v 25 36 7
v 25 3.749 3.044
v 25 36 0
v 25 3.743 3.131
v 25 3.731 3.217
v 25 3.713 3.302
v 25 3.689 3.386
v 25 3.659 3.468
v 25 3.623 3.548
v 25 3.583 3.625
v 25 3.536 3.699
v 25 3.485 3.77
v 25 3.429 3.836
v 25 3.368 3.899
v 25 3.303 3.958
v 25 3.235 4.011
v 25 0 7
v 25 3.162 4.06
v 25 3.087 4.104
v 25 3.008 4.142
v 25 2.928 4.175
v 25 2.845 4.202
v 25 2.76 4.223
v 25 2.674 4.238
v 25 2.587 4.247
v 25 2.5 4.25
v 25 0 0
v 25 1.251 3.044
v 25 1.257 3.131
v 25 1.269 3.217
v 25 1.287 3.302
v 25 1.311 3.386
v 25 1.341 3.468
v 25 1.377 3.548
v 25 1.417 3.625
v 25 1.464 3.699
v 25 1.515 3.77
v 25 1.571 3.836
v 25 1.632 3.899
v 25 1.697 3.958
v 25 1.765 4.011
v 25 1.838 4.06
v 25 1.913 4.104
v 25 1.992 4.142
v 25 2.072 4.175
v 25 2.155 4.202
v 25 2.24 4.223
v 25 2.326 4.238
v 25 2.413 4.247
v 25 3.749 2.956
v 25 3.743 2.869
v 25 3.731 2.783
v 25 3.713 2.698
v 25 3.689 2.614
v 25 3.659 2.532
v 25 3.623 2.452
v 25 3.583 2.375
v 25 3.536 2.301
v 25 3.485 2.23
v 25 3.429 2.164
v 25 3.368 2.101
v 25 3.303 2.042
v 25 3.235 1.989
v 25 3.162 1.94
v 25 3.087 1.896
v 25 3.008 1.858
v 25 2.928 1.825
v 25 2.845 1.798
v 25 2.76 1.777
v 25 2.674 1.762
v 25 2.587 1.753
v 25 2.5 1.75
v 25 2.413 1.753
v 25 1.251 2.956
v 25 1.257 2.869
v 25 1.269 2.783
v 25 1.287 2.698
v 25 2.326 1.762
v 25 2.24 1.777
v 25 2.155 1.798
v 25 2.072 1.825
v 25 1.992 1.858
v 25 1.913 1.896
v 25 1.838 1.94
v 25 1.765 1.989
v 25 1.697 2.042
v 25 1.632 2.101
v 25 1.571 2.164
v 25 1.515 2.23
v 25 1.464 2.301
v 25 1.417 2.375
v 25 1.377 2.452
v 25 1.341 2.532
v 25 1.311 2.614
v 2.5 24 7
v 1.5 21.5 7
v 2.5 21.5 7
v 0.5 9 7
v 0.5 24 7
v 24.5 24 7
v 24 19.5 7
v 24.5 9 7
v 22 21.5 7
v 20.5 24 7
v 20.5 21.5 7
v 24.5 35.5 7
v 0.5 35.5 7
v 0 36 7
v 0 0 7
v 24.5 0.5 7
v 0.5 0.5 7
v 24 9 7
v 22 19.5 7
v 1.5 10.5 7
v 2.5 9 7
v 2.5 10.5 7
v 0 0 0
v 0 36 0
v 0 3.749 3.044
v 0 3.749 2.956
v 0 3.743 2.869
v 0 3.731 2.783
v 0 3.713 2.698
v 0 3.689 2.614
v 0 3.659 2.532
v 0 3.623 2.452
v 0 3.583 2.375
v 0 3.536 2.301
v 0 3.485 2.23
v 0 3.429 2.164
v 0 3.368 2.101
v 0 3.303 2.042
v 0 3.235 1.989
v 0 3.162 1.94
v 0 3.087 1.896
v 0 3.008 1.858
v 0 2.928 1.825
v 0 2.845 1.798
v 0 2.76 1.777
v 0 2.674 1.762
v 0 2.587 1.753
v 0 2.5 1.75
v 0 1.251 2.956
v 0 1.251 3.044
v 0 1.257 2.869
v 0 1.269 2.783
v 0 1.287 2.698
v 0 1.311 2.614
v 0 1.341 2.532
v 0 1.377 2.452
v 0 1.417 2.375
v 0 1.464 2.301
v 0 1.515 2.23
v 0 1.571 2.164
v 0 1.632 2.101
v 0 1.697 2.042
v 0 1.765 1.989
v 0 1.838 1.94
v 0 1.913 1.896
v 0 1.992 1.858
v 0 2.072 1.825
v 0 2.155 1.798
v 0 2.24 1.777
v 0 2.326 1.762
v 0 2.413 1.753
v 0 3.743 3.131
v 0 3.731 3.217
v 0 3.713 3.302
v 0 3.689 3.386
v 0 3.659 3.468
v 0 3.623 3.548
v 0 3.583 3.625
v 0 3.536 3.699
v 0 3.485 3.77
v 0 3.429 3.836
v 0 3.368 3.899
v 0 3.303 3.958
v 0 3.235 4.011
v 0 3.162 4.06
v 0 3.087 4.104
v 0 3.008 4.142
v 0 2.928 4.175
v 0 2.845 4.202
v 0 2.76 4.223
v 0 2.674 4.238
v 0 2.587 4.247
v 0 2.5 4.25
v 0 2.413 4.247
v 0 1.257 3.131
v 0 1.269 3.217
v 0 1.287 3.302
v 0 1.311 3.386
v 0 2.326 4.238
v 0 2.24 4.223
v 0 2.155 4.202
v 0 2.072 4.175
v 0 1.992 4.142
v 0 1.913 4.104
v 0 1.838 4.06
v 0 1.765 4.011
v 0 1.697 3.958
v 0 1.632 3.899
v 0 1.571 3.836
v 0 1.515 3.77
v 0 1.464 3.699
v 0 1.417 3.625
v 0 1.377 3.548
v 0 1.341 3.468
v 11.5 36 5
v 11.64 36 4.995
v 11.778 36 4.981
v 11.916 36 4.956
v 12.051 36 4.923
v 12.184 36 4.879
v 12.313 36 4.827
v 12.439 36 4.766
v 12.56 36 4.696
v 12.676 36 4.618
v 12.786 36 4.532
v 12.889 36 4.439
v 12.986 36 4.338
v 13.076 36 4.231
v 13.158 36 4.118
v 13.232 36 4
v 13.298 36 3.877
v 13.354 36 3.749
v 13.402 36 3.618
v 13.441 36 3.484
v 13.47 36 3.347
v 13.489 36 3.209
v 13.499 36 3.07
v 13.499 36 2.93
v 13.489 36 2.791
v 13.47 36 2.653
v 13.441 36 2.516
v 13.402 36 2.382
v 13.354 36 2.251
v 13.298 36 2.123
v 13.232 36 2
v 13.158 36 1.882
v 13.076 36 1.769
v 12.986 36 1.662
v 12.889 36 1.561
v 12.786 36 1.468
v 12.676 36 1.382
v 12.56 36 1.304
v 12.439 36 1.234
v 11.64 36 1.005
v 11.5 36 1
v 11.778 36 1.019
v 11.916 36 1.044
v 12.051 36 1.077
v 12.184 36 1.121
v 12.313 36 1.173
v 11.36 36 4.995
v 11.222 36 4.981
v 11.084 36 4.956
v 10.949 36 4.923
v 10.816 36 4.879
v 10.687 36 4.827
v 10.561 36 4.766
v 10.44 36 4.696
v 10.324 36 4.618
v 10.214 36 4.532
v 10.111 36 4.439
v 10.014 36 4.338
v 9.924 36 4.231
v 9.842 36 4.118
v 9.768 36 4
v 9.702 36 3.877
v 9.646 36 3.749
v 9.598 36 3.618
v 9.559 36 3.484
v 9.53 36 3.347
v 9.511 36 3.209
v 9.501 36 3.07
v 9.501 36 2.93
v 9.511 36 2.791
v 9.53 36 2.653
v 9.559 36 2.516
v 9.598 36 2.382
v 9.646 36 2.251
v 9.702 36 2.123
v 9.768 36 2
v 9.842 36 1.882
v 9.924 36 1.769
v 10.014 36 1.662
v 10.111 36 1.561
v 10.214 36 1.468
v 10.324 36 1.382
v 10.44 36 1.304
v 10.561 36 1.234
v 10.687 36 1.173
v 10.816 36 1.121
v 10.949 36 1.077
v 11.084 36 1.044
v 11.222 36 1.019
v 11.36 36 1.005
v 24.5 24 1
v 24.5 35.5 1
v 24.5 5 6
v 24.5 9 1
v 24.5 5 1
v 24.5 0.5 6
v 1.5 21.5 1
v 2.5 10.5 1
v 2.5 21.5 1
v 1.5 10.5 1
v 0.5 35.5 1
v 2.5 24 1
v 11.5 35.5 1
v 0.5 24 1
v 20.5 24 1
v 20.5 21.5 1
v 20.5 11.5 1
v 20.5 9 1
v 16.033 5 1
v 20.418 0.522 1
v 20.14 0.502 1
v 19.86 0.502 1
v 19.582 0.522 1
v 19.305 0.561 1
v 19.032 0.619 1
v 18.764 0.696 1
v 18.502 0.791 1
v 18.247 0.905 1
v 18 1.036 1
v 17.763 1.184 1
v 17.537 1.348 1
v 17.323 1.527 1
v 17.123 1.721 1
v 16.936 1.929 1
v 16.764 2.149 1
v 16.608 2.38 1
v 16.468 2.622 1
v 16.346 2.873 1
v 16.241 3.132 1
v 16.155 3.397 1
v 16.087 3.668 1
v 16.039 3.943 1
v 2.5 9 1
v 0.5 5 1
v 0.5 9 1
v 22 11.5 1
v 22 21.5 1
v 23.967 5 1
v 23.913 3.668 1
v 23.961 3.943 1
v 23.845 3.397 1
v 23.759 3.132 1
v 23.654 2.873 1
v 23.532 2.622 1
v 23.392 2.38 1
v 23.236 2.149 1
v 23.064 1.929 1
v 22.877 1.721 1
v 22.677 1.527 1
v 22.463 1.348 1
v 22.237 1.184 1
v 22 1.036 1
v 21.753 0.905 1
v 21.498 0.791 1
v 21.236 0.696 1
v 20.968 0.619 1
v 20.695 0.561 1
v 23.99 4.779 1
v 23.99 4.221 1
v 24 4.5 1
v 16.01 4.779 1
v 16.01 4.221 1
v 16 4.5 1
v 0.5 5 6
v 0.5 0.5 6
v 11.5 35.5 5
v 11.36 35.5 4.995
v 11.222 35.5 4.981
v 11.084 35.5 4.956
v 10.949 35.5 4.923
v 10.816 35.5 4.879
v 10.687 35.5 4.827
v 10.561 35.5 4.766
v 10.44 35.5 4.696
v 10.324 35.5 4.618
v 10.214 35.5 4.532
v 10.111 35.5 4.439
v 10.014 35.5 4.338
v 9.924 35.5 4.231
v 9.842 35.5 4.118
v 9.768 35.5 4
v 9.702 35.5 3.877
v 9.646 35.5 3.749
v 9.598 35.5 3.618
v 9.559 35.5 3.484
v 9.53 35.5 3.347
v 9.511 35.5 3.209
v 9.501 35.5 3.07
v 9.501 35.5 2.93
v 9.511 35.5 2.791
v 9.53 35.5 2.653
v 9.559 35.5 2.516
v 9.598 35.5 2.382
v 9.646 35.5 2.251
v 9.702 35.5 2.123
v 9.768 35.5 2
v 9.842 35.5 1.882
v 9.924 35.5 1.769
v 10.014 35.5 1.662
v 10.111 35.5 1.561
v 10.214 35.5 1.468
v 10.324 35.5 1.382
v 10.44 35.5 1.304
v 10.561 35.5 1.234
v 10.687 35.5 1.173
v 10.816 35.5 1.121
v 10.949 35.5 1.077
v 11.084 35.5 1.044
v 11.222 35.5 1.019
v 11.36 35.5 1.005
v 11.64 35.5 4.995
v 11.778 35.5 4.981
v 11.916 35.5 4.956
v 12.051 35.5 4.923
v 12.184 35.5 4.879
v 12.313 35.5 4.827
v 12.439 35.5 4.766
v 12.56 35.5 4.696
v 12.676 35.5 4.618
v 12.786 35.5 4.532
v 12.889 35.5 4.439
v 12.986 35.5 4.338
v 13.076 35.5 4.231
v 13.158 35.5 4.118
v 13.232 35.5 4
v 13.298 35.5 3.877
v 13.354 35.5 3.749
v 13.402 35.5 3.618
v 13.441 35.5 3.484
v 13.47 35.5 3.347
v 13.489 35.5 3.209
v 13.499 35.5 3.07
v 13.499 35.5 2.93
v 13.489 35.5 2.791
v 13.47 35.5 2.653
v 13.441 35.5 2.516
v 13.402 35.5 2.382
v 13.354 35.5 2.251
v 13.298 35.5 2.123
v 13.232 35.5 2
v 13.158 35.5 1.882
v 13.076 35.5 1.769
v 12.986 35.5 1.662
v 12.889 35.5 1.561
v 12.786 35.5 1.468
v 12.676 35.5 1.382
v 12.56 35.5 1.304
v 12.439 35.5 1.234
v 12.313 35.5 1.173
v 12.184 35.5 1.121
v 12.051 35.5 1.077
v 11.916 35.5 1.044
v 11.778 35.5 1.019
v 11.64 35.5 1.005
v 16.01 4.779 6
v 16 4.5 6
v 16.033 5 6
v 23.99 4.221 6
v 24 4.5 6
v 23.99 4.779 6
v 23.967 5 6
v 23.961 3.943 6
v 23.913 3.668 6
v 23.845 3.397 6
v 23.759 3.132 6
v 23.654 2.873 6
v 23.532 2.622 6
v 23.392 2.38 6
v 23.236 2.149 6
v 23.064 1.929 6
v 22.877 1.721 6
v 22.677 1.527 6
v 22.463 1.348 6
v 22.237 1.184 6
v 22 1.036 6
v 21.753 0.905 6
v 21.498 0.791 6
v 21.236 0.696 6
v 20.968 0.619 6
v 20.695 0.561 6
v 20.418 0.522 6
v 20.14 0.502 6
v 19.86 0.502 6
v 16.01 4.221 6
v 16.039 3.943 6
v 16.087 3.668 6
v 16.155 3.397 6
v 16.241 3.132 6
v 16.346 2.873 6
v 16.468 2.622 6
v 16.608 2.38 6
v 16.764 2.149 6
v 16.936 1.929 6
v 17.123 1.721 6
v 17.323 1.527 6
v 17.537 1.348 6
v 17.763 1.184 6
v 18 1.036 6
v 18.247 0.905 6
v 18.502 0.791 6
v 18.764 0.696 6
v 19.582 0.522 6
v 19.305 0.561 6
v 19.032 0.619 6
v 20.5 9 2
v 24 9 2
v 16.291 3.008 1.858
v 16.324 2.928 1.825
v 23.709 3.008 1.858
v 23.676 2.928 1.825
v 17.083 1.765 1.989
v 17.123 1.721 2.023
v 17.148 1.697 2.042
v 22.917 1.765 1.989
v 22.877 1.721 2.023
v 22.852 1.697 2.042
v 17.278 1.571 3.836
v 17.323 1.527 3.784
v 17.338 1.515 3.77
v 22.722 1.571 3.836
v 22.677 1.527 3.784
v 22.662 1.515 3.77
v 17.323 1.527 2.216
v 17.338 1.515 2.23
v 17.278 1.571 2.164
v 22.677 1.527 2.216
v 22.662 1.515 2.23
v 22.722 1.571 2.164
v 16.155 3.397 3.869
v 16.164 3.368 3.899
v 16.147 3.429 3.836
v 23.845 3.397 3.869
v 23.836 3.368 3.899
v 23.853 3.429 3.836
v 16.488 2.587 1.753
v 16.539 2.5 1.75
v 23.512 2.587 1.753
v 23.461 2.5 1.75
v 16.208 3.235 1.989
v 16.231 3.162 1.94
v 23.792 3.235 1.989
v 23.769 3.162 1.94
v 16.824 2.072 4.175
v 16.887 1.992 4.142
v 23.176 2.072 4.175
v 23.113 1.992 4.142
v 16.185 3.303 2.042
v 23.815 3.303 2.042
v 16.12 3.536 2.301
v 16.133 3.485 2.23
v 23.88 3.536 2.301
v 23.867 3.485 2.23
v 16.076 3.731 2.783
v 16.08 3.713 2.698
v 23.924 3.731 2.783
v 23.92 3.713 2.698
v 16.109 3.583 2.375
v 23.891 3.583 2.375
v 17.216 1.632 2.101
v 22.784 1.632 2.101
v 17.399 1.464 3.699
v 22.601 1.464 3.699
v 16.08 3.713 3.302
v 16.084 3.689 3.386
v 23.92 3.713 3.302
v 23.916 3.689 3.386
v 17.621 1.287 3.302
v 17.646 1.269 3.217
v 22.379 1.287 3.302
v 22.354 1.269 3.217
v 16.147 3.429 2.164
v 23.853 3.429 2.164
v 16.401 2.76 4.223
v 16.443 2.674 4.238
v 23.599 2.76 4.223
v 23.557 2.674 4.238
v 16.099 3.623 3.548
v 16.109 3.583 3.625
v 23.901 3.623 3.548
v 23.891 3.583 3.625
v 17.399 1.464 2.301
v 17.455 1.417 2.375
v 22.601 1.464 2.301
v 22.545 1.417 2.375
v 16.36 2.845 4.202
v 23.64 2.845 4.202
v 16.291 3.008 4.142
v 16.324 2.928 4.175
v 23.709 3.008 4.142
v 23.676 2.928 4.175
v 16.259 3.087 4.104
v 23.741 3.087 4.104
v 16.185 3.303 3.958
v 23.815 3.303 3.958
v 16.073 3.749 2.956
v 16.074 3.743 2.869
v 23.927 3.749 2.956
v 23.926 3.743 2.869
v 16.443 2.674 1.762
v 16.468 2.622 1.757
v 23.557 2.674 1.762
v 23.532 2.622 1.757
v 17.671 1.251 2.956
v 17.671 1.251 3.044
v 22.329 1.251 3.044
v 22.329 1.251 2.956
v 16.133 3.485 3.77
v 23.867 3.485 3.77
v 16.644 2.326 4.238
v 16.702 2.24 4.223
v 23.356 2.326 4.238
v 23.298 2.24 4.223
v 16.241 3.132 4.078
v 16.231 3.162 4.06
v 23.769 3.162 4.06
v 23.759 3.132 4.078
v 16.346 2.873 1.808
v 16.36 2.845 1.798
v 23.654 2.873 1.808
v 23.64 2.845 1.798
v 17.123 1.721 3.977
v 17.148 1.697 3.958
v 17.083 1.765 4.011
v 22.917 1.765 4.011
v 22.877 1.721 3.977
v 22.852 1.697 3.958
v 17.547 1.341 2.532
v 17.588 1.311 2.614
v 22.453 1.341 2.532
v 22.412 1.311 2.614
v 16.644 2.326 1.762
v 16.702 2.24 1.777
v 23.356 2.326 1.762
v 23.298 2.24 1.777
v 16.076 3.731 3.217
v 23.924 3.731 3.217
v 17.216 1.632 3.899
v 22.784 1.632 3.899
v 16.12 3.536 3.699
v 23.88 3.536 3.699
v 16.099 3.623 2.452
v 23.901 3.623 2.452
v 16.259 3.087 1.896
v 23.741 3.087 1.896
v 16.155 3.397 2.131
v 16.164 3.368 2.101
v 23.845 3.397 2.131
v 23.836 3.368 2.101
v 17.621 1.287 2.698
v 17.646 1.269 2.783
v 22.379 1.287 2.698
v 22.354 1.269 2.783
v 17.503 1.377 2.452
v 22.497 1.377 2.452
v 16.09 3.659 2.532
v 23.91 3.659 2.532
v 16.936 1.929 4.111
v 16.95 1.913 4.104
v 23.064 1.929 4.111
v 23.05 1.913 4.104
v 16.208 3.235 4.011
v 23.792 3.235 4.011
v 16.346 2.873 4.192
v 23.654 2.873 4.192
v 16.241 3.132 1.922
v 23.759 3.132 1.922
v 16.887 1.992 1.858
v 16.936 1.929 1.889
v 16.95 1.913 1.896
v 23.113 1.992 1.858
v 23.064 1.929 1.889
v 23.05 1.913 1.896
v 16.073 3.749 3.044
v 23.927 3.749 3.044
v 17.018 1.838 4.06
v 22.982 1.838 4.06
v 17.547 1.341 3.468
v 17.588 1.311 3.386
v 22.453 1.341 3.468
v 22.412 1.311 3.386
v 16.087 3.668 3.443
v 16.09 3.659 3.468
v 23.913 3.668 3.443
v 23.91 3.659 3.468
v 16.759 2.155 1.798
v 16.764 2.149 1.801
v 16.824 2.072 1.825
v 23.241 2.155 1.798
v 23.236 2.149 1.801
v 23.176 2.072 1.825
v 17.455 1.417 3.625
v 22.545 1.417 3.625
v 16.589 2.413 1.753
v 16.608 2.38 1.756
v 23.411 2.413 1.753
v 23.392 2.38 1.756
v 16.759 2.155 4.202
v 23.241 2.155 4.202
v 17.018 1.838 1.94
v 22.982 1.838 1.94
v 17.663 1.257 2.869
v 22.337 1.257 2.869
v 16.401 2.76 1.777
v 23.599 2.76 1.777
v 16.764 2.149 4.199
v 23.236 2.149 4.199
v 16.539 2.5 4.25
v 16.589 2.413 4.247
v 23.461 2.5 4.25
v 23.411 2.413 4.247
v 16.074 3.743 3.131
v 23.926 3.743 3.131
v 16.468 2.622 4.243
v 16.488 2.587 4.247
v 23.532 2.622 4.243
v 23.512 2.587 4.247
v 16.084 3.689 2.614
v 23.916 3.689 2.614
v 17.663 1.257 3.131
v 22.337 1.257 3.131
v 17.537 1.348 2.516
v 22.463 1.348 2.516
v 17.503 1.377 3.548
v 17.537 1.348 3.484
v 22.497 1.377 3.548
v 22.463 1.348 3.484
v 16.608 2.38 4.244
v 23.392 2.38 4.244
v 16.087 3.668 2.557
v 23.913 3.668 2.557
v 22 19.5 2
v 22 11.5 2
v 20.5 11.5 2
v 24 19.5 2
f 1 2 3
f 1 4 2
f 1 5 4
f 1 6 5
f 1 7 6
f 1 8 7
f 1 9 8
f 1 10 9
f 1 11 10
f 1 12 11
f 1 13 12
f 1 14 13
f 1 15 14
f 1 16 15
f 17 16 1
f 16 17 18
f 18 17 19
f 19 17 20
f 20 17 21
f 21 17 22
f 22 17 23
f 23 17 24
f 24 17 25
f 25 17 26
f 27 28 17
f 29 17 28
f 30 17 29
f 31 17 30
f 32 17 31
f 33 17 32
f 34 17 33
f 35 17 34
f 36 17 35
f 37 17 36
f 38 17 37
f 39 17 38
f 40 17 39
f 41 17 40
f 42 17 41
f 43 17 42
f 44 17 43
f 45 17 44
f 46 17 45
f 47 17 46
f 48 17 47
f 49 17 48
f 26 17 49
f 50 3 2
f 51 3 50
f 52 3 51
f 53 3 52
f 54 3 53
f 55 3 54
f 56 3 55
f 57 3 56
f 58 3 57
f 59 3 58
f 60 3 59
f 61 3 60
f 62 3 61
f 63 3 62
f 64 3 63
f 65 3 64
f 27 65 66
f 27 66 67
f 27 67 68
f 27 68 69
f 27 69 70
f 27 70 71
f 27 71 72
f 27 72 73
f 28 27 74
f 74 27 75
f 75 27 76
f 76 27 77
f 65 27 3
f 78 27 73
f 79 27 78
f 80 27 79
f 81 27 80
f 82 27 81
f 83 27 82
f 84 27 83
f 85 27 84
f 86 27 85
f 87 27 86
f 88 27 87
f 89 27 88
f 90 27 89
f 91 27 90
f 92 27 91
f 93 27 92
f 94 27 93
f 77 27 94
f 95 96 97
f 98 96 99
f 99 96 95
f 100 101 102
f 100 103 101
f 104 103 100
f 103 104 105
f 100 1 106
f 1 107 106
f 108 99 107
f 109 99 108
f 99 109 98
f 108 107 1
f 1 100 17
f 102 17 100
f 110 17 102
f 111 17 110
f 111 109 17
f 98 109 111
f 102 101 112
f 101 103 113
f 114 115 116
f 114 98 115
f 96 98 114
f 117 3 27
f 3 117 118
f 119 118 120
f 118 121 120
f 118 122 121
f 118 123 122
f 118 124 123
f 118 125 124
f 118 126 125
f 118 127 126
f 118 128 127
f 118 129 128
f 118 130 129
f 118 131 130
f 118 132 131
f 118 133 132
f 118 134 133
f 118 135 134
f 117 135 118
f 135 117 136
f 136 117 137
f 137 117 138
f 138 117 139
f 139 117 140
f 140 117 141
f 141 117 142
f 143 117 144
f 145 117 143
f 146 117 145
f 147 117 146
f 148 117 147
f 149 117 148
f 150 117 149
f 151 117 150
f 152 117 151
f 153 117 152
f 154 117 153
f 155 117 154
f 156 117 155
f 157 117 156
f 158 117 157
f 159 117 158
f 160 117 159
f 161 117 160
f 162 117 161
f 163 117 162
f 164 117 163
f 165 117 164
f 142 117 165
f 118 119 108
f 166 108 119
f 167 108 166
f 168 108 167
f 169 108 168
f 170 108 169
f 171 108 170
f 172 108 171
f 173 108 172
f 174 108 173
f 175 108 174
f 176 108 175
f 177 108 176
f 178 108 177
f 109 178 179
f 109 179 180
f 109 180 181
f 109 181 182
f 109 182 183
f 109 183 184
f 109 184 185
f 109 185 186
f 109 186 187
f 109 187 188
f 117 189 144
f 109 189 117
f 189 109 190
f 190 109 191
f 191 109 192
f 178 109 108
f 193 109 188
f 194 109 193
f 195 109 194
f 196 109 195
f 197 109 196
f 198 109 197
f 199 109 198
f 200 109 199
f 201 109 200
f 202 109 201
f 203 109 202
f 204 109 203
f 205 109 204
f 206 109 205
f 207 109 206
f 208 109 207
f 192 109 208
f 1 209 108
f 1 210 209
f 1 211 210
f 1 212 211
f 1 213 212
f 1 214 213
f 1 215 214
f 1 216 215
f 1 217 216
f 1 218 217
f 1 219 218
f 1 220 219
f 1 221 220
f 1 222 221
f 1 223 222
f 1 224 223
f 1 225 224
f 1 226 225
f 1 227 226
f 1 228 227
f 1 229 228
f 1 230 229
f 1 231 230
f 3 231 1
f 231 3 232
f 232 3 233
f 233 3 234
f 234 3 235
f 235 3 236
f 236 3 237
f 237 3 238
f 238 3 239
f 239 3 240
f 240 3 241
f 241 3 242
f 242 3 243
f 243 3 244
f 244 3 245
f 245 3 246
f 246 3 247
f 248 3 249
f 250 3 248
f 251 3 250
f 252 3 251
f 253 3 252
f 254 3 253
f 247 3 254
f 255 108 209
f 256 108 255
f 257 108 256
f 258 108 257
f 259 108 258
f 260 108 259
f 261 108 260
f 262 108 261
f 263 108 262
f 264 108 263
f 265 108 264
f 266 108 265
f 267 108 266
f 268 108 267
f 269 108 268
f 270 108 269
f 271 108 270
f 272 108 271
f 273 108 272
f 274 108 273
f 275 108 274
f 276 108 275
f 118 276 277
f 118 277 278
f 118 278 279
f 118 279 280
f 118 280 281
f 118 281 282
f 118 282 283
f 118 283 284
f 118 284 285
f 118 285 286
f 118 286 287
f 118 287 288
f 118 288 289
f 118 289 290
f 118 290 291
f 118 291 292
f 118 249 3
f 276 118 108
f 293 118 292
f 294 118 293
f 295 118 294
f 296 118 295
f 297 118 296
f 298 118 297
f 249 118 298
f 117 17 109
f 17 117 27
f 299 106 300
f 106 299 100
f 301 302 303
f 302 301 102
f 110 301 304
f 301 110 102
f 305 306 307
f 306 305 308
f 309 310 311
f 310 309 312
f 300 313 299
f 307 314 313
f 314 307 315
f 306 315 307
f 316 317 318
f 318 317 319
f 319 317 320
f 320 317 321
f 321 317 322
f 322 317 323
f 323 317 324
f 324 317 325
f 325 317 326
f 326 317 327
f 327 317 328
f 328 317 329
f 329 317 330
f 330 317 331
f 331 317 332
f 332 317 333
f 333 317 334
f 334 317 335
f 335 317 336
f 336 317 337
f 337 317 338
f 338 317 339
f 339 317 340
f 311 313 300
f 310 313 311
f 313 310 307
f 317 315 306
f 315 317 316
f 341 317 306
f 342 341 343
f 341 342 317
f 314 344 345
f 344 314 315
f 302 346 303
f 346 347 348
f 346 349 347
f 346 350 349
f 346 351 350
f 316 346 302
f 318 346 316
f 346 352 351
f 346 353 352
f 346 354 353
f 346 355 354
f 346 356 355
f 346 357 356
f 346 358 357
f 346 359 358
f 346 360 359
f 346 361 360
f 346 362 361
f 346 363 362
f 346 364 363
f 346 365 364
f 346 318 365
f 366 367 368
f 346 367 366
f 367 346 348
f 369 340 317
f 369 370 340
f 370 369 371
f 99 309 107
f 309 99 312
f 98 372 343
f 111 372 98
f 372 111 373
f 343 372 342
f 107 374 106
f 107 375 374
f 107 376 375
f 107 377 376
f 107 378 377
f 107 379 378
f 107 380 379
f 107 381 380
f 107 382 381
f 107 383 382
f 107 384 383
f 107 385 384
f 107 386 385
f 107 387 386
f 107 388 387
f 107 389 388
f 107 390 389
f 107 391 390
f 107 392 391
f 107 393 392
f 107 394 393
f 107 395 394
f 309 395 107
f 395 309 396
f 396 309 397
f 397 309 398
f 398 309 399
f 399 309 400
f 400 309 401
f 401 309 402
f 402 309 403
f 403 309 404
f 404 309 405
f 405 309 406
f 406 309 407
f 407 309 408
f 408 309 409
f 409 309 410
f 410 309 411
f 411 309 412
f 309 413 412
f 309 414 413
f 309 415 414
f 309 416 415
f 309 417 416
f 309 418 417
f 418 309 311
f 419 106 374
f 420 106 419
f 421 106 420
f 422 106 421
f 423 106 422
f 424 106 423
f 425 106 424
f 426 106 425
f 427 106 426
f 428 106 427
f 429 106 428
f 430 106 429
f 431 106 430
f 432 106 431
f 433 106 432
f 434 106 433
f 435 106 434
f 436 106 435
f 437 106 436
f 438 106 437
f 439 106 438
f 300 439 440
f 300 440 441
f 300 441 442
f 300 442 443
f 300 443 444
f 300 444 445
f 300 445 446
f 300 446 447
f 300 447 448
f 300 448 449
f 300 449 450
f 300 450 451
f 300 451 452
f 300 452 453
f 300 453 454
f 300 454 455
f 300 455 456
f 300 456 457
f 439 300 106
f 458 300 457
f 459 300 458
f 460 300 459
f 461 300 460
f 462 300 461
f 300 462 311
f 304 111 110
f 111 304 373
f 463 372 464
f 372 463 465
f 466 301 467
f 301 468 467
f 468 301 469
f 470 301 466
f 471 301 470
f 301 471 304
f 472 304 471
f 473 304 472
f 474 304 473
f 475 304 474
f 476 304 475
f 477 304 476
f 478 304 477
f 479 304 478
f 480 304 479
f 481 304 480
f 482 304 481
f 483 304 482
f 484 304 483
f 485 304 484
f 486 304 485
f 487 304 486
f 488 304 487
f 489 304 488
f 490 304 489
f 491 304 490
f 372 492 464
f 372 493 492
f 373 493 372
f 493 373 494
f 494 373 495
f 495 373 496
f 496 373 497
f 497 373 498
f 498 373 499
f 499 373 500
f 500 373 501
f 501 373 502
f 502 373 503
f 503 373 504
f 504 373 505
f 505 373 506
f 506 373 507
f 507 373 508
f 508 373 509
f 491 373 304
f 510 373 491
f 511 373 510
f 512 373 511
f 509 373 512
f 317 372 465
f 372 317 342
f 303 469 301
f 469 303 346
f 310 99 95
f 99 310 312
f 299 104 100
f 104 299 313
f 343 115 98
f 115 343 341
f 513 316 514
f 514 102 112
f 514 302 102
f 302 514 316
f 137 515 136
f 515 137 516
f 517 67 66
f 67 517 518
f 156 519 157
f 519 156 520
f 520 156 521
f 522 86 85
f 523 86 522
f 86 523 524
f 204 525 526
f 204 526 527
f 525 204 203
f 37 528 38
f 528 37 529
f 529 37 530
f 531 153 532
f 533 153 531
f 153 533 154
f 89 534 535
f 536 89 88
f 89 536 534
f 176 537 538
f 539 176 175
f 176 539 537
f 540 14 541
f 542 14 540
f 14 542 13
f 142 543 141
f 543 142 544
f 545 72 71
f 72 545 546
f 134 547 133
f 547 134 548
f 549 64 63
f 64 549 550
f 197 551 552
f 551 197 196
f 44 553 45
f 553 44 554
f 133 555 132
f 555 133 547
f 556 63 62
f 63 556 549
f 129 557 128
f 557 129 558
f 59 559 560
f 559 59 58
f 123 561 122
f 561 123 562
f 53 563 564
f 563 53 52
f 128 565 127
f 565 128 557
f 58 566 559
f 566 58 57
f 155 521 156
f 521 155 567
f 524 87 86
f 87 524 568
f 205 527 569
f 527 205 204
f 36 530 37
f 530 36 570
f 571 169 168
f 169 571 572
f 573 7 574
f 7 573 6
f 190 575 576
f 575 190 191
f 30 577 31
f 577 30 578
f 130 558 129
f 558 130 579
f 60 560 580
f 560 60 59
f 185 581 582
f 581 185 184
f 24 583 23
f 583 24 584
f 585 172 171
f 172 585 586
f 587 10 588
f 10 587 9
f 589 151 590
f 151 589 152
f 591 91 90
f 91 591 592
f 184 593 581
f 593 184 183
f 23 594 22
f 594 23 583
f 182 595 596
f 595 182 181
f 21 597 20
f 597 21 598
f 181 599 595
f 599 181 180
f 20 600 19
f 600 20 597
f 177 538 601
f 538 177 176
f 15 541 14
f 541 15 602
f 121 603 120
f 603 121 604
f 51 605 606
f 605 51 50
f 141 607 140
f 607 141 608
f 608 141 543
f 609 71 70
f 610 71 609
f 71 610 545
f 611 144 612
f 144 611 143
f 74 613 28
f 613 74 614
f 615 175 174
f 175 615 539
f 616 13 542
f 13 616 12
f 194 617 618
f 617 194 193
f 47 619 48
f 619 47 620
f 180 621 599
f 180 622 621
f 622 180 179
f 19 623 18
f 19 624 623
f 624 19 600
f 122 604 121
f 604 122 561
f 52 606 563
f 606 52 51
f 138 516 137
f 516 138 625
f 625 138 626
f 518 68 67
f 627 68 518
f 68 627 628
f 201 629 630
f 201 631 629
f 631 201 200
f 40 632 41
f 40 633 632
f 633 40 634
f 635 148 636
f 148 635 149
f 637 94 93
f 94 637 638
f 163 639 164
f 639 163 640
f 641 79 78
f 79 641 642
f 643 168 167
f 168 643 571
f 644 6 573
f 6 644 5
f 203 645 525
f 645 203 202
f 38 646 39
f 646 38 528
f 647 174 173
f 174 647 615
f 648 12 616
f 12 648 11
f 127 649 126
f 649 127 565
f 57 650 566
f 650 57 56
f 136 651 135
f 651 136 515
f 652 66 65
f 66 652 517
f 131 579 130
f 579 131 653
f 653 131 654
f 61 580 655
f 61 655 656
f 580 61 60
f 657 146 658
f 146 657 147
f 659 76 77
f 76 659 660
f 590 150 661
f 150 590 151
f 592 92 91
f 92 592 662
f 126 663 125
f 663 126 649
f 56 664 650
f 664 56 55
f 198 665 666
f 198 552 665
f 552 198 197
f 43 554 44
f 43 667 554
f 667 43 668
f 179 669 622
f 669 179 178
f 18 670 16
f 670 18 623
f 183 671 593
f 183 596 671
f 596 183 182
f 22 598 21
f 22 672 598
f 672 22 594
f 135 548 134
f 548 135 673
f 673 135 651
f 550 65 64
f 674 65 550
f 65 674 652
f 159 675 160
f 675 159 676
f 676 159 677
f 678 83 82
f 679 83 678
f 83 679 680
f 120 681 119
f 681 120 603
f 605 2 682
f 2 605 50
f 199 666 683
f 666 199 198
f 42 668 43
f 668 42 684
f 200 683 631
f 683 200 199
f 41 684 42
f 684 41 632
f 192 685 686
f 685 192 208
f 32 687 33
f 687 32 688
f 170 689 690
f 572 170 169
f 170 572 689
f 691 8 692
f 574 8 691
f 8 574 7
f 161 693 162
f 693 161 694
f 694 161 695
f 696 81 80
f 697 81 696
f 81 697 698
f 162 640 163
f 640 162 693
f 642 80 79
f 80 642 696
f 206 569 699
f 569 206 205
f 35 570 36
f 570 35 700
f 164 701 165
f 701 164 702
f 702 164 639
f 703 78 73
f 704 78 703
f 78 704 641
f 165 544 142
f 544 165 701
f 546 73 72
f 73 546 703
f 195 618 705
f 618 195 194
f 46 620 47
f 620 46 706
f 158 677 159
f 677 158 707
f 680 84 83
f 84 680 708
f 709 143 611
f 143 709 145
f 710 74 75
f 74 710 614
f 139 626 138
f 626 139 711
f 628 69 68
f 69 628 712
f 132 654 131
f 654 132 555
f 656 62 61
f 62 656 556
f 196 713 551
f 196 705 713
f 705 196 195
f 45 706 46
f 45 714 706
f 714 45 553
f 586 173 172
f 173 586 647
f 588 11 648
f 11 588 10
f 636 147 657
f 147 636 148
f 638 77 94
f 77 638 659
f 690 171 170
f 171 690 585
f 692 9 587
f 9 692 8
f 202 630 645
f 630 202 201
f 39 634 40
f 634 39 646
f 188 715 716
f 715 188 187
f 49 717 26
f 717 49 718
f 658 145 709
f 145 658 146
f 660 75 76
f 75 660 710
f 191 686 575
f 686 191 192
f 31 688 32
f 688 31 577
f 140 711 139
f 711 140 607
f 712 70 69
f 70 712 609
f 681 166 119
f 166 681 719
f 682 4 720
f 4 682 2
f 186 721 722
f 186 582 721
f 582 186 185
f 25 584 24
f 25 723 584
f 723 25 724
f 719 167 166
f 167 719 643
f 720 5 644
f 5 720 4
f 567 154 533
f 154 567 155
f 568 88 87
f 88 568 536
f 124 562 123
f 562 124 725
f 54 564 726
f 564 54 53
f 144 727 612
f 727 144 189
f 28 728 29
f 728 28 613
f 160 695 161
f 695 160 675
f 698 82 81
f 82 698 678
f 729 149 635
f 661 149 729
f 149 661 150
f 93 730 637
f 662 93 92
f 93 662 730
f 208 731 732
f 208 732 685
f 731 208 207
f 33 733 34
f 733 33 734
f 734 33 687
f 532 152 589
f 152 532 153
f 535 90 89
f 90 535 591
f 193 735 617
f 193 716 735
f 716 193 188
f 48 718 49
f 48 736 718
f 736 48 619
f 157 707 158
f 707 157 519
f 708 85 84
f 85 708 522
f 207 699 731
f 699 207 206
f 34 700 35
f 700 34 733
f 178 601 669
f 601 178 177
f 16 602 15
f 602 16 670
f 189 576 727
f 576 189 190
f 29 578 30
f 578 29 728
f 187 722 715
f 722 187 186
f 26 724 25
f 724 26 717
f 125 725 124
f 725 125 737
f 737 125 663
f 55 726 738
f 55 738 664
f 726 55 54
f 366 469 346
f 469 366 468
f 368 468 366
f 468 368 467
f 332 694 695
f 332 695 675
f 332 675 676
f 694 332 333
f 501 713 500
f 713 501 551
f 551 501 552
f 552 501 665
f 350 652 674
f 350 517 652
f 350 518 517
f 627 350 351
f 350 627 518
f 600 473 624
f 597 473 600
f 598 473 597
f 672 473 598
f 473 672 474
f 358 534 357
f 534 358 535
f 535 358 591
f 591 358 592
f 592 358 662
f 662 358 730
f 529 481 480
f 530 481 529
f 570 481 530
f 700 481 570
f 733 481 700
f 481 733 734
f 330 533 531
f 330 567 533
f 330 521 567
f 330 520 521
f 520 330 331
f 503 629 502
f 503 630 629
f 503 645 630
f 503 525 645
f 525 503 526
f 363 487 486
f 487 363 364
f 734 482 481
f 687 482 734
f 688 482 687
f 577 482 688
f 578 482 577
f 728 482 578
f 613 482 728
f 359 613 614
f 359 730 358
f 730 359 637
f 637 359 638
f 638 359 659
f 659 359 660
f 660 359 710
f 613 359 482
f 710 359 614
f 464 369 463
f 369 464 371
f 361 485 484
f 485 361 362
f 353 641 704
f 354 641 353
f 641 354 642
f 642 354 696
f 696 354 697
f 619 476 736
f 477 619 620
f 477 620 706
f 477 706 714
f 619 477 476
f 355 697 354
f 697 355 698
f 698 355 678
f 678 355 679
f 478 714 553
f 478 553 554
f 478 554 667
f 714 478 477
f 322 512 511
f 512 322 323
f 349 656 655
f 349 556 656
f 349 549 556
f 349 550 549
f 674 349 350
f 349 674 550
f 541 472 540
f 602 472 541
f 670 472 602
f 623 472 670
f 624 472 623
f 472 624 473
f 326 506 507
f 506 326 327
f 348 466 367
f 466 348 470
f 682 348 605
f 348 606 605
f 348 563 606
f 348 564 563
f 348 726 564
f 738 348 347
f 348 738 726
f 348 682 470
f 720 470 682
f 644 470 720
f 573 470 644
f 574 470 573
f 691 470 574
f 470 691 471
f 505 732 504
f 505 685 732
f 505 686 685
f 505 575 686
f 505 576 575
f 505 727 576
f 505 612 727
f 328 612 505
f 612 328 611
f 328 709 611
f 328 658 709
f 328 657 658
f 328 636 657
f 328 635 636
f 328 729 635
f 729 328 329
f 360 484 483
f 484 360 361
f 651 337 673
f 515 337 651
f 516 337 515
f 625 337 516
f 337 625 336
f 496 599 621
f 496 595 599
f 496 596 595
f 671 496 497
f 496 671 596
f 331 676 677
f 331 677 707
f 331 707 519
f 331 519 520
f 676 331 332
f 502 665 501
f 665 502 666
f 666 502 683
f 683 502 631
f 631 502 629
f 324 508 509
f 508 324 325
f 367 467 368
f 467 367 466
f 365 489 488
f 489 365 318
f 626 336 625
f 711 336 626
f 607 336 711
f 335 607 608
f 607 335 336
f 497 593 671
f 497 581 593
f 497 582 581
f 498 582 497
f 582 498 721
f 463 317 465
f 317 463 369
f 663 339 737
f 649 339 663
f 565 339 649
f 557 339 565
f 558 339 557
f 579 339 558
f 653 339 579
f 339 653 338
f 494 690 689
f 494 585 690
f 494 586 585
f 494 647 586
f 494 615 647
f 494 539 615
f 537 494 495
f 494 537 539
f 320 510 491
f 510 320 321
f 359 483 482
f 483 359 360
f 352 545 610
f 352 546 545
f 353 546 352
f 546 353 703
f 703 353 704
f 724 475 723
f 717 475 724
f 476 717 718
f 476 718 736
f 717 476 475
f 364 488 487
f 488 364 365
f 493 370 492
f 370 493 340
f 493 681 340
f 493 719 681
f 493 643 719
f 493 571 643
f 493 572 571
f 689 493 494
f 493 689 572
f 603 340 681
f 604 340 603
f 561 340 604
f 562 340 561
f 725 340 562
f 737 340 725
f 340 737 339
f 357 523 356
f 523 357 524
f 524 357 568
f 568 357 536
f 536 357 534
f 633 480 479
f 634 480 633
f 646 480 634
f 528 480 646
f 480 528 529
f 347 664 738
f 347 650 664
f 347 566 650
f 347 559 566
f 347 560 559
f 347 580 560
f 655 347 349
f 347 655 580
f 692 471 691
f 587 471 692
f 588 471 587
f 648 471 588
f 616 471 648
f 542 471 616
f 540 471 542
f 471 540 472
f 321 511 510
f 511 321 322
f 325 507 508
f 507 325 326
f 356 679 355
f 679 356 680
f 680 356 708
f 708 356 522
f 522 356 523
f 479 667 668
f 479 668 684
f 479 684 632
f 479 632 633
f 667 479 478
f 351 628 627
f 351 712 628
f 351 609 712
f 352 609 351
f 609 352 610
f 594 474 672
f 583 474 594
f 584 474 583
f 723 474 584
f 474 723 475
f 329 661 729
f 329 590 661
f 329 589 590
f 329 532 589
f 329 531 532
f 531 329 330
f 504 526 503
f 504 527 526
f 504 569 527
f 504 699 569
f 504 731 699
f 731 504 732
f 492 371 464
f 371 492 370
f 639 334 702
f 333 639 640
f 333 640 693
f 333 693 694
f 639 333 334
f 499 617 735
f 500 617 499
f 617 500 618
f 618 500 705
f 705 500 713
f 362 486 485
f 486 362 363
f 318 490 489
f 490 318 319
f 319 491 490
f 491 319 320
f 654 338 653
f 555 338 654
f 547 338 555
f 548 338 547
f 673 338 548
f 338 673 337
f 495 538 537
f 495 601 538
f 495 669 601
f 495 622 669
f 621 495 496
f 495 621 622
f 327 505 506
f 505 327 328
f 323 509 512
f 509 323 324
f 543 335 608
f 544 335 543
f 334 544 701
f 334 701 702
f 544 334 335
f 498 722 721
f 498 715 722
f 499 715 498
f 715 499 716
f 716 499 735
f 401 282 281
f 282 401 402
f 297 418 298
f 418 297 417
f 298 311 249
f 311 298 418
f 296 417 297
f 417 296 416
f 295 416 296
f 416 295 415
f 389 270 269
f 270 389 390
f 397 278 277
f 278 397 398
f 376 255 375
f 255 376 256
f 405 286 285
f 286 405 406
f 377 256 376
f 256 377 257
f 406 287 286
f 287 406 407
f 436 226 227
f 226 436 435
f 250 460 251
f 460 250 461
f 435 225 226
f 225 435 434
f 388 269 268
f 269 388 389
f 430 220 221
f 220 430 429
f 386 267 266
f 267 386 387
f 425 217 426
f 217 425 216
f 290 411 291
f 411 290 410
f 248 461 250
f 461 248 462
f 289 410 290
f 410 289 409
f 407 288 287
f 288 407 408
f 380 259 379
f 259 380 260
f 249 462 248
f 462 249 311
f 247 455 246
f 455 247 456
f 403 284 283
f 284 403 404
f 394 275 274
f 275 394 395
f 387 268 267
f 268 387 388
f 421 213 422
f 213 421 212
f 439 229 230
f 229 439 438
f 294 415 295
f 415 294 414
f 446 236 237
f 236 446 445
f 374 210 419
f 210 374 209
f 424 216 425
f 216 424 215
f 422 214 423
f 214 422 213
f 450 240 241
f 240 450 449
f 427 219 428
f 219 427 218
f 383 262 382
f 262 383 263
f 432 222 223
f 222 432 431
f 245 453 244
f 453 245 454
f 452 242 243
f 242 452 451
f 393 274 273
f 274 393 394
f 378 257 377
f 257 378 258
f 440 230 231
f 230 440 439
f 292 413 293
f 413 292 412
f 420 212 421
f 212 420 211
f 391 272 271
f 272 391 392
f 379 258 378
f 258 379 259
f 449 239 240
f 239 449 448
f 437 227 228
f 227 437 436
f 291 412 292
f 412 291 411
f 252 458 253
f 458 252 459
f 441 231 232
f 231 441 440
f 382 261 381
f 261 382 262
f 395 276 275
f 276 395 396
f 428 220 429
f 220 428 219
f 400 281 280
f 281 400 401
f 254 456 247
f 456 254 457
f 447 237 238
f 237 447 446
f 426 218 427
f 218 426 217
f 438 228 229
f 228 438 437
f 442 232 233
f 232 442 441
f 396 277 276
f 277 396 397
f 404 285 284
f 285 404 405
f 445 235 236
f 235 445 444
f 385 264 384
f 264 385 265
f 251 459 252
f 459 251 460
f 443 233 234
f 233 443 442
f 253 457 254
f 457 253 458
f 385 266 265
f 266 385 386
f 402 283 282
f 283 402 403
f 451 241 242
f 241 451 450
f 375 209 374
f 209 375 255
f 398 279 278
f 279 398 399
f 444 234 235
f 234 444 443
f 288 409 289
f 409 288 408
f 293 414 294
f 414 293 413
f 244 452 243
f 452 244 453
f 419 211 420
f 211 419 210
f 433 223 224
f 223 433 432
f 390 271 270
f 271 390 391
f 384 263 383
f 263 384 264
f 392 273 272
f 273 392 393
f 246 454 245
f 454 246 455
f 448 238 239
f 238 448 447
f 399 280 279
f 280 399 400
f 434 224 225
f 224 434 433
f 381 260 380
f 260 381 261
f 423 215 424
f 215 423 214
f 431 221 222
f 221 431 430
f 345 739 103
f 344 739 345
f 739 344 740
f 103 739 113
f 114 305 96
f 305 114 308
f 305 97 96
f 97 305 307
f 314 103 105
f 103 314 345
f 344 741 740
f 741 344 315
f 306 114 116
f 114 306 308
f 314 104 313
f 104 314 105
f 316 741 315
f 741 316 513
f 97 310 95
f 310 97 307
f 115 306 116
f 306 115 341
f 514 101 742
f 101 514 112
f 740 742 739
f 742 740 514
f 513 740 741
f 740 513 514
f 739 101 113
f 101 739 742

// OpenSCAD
$fn = 90;

module baseBox() {
    cube([25,5,6]);

    translate([0,5+4,0])
        cube([25,15,7]);

    difference() {
        cube([25,36,7]);
        translate([.5,.5,1])
        cube([24,35,6]);
    }
}

module boxWithCutout() {
    difference() {
        baseBox();

        translate([-2,2.5,3])
            rotate([0,90,0])
                #cylinder(30, d=2.5);

        translate([20,4.5,1])
            #cylinder(30, d=8);

        translate([11.5,20,3])
            rotate([0,90,90])
                #cylinder(30,d=4);
    }
}

module switchCutout() {
    translate([1.5,11.5,1])
        cube([20.5,10,8]);

    translate([1.5,10.5,1])
        cube([10,11,8]);

    translate([2.5,8,1])
        cube([18,16,8]);

    translate([14,8.5,2])
        #cube([10,11,7]);

}

difference() {
    boxWithCutout();
        switchCutout();
}
